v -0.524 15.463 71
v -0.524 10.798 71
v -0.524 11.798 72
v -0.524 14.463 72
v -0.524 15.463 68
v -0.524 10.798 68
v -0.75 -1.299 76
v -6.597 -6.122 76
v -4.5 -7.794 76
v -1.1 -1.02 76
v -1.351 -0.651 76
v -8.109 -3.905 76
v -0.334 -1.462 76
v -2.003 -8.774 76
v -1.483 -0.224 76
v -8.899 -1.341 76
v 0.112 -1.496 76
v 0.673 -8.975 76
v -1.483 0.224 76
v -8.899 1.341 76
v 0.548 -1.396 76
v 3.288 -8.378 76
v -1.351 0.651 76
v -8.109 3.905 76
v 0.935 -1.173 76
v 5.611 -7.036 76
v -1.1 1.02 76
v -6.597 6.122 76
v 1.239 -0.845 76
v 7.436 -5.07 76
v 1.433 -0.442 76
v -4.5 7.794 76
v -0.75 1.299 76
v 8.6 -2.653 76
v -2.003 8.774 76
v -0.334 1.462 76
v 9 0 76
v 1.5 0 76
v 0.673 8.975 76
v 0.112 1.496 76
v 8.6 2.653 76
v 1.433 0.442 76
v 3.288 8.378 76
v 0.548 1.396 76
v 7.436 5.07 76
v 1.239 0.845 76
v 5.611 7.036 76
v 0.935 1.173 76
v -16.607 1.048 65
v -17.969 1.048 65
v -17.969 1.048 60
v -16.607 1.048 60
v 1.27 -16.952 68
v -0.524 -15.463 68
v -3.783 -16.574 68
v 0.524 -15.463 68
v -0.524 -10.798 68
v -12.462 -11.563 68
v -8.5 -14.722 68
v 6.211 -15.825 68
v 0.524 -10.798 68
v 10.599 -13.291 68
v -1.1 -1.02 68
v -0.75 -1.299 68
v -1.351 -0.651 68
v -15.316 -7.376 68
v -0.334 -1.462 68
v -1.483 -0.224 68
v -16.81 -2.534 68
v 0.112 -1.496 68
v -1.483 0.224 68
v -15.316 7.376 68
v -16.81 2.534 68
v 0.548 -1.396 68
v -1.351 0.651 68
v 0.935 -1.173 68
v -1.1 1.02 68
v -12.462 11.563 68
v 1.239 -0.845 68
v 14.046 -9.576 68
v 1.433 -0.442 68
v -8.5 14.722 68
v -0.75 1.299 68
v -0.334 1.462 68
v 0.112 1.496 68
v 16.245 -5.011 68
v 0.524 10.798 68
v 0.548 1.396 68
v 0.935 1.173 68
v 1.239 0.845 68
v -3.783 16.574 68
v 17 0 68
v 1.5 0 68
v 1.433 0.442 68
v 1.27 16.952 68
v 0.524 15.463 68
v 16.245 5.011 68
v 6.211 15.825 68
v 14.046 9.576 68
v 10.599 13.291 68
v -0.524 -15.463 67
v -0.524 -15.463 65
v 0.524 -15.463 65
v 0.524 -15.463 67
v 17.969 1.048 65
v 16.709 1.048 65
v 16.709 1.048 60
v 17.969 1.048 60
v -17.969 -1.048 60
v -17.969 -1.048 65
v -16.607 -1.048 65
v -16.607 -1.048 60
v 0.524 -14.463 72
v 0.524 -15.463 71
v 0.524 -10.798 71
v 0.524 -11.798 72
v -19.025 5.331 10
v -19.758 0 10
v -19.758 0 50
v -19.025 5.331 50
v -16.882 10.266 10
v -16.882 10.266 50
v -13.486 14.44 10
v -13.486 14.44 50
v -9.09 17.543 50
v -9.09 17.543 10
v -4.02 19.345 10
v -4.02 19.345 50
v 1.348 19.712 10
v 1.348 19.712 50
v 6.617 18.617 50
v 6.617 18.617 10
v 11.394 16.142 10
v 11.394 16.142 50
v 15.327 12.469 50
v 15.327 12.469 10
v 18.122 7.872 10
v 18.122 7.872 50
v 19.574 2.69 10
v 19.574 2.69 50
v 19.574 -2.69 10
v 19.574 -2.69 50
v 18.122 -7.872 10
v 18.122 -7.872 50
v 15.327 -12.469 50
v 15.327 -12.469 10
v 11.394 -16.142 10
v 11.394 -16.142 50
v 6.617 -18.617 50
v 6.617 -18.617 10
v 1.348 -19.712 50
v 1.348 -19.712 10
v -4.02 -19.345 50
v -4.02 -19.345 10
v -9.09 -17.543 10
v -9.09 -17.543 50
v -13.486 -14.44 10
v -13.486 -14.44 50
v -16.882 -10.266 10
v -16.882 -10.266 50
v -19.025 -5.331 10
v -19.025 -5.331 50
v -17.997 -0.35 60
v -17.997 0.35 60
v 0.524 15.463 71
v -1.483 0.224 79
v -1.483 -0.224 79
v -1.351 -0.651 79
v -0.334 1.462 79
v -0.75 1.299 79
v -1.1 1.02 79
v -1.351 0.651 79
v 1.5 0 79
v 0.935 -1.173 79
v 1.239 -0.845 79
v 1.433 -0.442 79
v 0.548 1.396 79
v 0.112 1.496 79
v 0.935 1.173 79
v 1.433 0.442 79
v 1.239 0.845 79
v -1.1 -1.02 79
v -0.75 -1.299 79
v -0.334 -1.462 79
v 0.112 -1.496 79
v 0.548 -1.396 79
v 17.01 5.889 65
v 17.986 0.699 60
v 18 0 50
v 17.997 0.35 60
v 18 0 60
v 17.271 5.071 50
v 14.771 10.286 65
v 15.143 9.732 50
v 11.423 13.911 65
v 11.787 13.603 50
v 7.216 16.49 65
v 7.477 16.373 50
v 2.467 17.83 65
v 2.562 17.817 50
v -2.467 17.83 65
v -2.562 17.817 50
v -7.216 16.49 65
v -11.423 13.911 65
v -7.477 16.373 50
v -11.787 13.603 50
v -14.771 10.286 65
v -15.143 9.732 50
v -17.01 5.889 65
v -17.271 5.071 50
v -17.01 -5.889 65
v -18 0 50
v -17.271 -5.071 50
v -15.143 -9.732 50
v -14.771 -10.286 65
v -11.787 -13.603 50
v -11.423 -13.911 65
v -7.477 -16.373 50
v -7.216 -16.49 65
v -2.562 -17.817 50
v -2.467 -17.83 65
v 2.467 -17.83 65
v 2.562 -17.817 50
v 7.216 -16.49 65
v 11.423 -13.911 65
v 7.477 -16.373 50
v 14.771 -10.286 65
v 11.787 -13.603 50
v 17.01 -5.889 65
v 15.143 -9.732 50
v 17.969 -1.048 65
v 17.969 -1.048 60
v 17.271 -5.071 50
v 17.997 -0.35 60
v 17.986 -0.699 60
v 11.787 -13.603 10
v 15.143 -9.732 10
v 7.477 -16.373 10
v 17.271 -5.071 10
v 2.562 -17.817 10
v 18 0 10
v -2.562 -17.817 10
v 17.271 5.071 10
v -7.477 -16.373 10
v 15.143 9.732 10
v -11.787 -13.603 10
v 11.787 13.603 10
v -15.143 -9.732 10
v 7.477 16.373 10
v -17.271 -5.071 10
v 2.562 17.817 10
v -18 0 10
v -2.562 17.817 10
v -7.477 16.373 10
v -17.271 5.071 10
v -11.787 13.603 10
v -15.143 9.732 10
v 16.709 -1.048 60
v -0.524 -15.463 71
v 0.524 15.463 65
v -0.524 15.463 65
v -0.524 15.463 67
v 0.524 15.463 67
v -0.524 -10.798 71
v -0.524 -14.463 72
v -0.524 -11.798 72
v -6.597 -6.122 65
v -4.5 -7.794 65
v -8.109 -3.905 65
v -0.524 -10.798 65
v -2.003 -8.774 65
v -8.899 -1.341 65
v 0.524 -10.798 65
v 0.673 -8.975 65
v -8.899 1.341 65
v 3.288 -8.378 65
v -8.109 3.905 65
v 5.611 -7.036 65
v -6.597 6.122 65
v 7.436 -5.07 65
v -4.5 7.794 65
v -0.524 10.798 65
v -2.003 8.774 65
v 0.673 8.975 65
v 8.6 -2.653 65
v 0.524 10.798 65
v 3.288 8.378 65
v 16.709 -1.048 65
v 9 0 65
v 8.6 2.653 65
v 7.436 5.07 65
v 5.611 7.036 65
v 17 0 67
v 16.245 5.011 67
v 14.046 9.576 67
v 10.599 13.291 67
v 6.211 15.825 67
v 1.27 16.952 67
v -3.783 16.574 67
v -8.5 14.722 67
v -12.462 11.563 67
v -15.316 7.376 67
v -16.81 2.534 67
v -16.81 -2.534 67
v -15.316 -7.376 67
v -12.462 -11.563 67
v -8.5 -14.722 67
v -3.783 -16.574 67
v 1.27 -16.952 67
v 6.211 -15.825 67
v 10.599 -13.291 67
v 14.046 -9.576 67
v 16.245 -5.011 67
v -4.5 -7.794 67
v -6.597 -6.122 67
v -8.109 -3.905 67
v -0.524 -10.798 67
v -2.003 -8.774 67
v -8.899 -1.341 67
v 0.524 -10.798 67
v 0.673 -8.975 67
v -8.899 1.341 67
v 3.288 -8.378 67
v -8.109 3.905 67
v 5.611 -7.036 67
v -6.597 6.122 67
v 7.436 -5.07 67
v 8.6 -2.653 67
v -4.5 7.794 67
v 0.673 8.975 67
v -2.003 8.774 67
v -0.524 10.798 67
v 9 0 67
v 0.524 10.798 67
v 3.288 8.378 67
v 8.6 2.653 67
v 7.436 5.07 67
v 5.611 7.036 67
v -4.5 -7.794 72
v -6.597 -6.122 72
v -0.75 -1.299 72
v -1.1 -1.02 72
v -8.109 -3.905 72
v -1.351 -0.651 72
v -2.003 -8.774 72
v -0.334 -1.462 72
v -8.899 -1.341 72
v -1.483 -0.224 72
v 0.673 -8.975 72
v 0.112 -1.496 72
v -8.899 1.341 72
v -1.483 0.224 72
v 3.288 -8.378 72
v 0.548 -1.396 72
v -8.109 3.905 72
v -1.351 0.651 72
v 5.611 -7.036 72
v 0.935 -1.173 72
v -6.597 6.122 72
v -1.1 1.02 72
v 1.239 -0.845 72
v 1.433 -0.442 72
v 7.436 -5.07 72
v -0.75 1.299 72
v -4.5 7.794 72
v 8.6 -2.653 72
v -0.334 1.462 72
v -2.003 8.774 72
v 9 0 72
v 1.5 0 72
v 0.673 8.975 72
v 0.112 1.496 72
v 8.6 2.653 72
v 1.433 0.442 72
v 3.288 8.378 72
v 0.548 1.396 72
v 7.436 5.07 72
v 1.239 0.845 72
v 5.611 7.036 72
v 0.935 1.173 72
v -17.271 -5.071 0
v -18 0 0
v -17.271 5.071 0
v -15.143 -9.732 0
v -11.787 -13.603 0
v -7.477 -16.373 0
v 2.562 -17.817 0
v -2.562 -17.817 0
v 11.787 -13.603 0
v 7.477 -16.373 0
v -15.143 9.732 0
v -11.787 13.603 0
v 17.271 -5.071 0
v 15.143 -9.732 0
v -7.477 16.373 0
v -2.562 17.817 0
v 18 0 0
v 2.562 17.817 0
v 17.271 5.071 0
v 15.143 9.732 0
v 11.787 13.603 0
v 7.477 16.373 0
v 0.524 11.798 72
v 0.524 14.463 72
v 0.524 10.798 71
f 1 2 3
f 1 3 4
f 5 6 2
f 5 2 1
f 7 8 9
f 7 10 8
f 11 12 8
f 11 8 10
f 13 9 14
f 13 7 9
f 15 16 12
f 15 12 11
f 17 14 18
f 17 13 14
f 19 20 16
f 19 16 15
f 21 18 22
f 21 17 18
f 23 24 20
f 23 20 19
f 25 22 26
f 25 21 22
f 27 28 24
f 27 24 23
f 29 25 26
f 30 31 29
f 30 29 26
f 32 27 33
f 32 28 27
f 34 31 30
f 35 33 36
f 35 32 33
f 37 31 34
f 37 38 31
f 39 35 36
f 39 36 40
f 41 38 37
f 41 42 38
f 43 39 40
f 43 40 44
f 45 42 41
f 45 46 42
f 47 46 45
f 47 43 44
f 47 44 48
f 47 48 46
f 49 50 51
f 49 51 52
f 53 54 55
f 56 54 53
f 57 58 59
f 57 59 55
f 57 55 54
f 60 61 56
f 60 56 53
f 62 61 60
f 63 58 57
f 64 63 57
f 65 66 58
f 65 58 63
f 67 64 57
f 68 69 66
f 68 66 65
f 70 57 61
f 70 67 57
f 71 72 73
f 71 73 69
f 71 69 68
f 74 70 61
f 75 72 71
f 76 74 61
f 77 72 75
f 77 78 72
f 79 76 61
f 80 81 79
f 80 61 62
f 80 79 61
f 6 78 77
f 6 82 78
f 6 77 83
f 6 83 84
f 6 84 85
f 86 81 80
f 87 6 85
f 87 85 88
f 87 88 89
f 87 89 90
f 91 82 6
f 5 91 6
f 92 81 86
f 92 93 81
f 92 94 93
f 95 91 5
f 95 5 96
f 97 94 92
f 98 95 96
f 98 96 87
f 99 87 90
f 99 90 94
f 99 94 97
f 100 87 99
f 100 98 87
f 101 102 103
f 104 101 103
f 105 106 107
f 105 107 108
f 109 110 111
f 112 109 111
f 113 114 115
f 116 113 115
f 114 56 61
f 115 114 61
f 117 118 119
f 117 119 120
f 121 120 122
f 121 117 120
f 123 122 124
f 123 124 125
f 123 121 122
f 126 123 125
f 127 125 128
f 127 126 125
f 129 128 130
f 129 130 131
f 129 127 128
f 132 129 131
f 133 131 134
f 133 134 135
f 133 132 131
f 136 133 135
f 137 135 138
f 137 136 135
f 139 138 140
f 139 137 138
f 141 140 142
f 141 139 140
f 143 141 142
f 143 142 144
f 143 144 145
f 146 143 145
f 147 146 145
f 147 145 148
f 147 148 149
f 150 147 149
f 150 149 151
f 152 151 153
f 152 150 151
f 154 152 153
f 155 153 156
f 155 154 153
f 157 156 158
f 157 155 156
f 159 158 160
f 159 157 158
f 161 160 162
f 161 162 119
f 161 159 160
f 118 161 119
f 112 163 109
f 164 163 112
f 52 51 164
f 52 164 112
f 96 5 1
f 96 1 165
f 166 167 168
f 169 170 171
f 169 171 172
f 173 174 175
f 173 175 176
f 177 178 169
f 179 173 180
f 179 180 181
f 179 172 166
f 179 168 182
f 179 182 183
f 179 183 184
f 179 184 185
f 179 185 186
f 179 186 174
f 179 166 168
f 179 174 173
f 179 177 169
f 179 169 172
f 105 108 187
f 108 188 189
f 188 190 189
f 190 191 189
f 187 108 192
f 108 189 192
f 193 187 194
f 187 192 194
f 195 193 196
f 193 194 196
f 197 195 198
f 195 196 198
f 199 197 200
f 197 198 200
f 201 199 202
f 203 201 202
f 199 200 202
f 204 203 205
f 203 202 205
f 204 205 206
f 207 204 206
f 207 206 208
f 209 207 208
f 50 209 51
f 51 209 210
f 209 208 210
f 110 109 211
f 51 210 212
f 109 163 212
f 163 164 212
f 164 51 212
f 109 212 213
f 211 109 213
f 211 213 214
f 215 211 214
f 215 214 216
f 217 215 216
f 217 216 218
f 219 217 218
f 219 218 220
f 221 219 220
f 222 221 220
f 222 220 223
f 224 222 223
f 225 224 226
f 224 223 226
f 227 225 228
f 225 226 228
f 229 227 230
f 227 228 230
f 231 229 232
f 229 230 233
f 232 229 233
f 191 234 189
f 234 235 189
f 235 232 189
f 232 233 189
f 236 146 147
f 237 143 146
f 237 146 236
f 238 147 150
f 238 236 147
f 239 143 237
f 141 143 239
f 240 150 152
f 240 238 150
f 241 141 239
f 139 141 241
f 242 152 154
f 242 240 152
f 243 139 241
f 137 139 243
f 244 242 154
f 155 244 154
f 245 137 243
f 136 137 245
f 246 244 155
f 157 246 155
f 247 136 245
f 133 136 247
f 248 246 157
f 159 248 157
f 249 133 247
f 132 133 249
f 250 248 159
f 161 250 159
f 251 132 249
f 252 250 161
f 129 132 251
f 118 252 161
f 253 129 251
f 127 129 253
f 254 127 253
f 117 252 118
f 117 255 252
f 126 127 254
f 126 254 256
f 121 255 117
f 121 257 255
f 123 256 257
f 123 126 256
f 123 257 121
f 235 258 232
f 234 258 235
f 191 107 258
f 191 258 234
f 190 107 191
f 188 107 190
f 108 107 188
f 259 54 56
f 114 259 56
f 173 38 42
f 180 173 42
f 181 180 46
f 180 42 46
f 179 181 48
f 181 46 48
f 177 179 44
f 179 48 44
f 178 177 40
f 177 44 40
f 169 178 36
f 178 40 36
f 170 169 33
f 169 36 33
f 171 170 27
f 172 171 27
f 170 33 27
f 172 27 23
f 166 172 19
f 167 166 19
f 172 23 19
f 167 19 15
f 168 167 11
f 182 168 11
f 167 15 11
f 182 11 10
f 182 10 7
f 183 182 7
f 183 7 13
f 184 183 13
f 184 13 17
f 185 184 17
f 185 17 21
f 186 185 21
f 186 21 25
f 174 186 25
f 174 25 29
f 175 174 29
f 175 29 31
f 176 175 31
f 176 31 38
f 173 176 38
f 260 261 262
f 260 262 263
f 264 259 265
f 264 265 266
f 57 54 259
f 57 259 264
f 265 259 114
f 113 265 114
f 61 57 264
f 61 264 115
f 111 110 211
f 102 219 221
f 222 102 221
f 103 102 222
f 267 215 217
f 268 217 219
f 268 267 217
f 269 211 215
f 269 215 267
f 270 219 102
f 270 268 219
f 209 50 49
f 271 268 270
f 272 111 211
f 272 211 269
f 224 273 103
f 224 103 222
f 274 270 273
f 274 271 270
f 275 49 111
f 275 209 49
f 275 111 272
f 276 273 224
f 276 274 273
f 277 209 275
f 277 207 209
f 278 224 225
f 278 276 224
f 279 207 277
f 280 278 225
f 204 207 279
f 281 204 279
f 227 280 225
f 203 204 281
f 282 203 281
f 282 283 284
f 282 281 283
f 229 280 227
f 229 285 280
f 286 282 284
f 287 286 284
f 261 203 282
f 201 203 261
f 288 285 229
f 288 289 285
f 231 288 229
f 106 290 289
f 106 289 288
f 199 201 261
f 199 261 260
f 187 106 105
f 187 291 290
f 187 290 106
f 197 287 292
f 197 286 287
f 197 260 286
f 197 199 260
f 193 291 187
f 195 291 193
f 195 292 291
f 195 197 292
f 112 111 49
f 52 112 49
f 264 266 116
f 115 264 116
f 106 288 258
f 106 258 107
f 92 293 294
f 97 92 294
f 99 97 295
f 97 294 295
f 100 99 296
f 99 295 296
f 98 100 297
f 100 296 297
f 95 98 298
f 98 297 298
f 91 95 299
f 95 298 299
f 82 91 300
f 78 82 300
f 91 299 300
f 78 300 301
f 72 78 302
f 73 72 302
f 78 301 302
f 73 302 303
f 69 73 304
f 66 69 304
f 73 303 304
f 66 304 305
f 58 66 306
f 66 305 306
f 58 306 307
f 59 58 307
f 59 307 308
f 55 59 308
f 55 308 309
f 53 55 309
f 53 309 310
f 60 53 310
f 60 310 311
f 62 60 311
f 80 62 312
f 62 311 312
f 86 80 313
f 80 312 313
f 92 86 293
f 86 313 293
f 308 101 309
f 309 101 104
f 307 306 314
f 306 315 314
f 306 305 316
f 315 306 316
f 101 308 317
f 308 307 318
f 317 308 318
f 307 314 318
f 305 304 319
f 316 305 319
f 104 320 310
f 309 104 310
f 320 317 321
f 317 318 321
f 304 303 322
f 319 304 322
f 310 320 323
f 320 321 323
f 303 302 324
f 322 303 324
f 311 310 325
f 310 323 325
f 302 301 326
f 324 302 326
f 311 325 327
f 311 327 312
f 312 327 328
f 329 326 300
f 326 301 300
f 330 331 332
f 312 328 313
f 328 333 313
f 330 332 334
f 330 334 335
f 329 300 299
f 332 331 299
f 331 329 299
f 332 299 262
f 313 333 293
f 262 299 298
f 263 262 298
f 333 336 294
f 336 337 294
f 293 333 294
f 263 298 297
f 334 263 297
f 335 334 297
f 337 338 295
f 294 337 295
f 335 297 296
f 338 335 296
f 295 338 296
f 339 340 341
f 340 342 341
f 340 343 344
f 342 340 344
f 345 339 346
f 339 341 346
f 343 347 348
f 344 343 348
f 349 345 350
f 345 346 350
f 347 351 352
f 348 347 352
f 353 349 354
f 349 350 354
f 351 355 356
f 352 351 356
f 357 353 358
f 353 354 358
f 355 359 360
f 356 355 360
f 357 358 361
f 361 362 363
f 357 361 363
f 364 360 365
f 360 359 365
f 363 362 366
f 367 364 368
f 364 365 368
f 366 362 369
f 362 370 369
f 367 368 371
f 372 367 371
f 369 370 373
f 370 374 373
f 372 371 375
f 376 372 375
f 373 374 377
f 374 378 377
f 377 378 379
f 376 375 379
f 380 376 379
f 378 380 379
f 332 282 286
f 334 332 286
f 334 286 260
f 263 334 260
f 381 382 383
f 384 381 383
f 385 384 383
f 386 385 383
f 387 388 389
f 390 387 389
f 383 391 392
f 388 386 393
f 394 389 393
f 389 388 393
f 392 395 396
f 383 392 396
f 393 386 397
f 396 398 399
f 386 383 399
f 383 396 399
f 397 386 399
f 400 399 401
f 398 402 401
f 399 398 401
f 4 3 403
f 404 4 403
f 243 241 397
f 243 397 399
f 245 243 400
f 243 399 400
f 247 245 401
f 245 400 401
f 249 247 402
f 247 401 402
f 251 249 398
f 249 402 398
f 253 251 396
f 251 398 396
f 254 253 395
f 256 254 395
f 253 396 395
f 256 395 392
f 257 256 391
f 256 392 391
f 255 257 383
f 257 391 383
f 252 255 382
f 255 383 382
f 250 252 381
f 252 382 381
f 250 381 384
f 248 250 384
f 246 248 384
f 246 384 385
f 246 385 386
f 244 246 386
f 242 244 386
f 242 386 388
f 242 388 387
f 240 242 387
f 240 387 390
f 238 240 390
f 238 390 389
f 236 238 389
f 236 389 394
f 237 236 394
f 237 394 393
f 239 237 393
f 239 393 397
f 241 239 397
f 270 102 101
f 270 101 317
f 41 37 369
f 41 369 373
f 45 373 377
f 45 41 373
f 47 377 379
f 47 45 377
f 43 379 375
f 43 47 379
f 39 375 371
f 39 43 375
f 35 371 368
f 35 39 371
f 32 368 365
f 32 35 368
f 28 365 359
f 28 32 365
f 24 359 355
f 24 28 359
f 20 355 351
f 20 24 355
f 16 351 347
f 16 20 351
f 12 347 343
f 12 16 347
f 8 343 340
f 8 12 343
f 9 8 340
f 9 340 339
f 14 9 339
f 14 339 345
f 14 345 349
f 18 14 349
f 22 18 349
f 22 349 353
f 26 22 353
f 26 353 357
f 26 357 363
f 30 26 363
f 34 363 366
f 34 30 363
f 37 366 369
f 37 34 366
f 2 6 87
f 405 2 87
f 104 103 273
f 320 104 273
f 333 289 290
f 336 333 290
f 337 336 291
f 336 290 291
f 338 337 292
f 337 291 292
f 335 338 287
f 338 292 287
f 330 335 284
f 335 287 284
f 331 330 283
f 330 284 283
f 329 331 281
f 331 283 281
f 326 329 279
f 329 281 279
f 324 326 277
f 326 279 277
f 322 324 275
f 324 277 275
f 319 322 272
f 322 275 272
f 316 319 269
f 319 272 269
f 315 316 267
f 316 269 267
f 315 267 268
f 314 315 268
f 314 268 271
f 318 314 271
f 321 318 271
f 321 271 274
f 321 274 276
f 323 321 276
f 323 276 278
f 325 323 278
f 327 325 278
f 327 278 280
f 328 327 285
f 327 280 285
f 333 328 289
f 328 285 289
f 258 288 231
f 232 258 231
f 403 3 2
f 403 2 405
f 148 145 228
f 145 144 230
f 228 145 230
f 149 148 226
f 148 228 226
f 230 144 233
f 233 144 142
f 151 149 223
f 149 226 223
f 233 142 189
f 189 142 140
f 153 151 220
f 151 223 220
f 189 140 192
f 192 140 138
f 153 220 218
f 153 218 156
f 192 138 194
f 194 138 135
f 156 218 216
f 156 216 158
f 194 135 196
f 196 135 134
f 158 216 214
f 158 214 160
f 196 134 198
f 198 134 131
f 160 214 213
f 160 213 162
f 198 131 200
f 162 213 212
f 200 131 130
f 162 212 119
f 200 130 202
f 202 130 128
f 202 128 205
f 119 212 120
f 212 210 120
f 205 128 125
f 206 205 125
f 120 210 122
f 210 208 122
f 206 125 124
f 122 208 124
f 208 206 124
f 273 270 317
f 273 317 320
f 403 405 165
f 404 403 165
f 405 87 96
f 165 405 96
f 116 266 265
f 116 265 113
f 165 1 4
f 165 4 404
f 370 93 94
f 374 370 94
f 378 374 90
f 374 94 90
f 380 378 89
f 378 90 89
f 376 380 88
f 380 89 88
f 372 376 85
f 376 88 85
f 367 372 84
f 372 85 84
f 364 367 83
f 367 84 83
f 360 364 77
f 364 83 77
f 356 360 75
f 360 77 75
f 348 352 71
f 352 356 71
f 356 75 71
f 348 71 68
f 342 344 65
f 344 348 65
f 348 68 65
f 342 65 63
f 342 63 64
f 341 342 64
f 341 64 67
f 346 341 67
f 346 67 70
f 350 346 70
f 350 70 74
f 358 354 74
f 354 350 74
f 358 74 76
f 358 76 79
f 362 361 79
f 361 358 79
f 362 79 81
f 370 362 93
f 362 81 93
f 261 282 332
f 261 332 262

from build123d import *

# Parameters (mm, degrees)
SKETCH1_R           = 18
BOSS_EXTRUDE1_DEPTH = 65
BOSS_EXTRUDE2_START = -10
SKETCH2_R           = 19.758093793
SKETCH2_R_2         = 18
BOSS_EXTRUDE2_DEPTH = 40
SKETCH3_R           = 1.5
BOSS_EXTRUDE3_DEPTH = 14
SKETCH4_R           = 9
BOSS_EXTRUDE4_DEPTH = 2
SKETCH5_R           = 17
BOSS_EXTRUDE5_DEPTH = 1
BOSS_EXTRUDE6_START = -3
SKETCH6_R           = 9
BOSS_EXTRUDE6_DEPTH = 4
SKETCH7_W           = 4.467838664
SKETCH7_H           = 2.096744874
SKETCH7_W_2         = 4.5697238
CUT_EXTRUDE1_DEPTH  = 5
SKETCH8_W           = 1.048372436
SKETCH8_H           = 4.665257343
BOSS_EXTRUDE7_DEPTH = 7
CHAMFER1_SIZE       = 1


with BuildPart() as part:
    # Sketch1 → Boss-Extrude1 (new body)
    with BuildSketch(Plane.XY):
        Circle(SKETCH1_R)
    extrude(amount=BOSS_EXTRUDE1_DEPTH)

    # Sketch2 → Boss-Extrude2 (add)
    with BuildSketch(Plane(origin=(0, 0, 0), x_dir=(-1, 0, 0), z_dir=(0, 0, -1)).offset(BOSS_EXTRUDE2_START)):
        Circle(SKETCH2_R)
        Circle(SKETCH2_R_2, mode=Mode.SUBTRACT)
    extrude(amount=-BOSS_EXTRUDE2_DEPTH)

    # Sketch3 → Boss-Extrude3 (add)
    with BuildSketch(Plane.XY.offset(65)):
        Circle(SKETCH3_R)
    extrude(amount=BOSS_EXTRUDE3_DEPTH)

    # Sketch4 → Boss-Extrude4 (add)
    with BuildSketch(Plane.XY.offset(65)):
        Circle(SKETCH4_R)
    extrude(amount=BOSS_EXTRUDE4_DEPTH)

    # Sketch5 → Boss-Extrude5 (add)
    with BuildSketch(Plane.XY.offset(67)):
        Circle(SKETCH5_R)
    extrude(amount=BOSS_EXTRUDE5_DEPTH)

    # Sketch6 → Boss-Extrude6 (add)
    with BuildSketch(Plane.XY.offset(79).offset(BOSS_EXTRUDE6_START)):
        Circle(SKETCH6_R)
    extrude(amount=-BOSS_EXTRUDE6_DEPTH)

    # Sketch7 → Cut-Extrude1 (cut)
    with BuildSketch(Plane.XY.offset(65)):
        with Locations((18.943203886, 0)):
            Rectangle(SKETCH7_W, SKETCH7_H)
        with Locations((-18.892261318, 0)):
            Rectangle(SKETCH7_W_2, SKETCH7_H)
    extrude(amount=-CUT_EXTRUDE1_DEPTH, mode=Mode.SUBTRACT)

    # Sketch8 → Boss-Extrude7 (add)
    with BuildSketch(Plane.XY.offset(65)):
        with Locations((0, 13.130864768)):
            Rectangle(SKETCH8_W, SKETCH8_H)
        with Locations((0, -13.130864768)):
            Rectangle(SKETCH8_W, SKETCH8_H)
    extrude(amount=BOSS_EXTRUDE7_DEPTH)

    # Chamfer1
    chamfer1_edges = [part.edges().sort_by_distance(p)[0] for p in [
        (0, -15.463493439, 72),
        (0, -10.798236096, 72),
        (0, 15.463493439, 72),
        (0, 10.798236096, 72),
    ]]
    chamfer(chamfer1_edges, length=CHAMFER1_SIZE)


solid = part.part
